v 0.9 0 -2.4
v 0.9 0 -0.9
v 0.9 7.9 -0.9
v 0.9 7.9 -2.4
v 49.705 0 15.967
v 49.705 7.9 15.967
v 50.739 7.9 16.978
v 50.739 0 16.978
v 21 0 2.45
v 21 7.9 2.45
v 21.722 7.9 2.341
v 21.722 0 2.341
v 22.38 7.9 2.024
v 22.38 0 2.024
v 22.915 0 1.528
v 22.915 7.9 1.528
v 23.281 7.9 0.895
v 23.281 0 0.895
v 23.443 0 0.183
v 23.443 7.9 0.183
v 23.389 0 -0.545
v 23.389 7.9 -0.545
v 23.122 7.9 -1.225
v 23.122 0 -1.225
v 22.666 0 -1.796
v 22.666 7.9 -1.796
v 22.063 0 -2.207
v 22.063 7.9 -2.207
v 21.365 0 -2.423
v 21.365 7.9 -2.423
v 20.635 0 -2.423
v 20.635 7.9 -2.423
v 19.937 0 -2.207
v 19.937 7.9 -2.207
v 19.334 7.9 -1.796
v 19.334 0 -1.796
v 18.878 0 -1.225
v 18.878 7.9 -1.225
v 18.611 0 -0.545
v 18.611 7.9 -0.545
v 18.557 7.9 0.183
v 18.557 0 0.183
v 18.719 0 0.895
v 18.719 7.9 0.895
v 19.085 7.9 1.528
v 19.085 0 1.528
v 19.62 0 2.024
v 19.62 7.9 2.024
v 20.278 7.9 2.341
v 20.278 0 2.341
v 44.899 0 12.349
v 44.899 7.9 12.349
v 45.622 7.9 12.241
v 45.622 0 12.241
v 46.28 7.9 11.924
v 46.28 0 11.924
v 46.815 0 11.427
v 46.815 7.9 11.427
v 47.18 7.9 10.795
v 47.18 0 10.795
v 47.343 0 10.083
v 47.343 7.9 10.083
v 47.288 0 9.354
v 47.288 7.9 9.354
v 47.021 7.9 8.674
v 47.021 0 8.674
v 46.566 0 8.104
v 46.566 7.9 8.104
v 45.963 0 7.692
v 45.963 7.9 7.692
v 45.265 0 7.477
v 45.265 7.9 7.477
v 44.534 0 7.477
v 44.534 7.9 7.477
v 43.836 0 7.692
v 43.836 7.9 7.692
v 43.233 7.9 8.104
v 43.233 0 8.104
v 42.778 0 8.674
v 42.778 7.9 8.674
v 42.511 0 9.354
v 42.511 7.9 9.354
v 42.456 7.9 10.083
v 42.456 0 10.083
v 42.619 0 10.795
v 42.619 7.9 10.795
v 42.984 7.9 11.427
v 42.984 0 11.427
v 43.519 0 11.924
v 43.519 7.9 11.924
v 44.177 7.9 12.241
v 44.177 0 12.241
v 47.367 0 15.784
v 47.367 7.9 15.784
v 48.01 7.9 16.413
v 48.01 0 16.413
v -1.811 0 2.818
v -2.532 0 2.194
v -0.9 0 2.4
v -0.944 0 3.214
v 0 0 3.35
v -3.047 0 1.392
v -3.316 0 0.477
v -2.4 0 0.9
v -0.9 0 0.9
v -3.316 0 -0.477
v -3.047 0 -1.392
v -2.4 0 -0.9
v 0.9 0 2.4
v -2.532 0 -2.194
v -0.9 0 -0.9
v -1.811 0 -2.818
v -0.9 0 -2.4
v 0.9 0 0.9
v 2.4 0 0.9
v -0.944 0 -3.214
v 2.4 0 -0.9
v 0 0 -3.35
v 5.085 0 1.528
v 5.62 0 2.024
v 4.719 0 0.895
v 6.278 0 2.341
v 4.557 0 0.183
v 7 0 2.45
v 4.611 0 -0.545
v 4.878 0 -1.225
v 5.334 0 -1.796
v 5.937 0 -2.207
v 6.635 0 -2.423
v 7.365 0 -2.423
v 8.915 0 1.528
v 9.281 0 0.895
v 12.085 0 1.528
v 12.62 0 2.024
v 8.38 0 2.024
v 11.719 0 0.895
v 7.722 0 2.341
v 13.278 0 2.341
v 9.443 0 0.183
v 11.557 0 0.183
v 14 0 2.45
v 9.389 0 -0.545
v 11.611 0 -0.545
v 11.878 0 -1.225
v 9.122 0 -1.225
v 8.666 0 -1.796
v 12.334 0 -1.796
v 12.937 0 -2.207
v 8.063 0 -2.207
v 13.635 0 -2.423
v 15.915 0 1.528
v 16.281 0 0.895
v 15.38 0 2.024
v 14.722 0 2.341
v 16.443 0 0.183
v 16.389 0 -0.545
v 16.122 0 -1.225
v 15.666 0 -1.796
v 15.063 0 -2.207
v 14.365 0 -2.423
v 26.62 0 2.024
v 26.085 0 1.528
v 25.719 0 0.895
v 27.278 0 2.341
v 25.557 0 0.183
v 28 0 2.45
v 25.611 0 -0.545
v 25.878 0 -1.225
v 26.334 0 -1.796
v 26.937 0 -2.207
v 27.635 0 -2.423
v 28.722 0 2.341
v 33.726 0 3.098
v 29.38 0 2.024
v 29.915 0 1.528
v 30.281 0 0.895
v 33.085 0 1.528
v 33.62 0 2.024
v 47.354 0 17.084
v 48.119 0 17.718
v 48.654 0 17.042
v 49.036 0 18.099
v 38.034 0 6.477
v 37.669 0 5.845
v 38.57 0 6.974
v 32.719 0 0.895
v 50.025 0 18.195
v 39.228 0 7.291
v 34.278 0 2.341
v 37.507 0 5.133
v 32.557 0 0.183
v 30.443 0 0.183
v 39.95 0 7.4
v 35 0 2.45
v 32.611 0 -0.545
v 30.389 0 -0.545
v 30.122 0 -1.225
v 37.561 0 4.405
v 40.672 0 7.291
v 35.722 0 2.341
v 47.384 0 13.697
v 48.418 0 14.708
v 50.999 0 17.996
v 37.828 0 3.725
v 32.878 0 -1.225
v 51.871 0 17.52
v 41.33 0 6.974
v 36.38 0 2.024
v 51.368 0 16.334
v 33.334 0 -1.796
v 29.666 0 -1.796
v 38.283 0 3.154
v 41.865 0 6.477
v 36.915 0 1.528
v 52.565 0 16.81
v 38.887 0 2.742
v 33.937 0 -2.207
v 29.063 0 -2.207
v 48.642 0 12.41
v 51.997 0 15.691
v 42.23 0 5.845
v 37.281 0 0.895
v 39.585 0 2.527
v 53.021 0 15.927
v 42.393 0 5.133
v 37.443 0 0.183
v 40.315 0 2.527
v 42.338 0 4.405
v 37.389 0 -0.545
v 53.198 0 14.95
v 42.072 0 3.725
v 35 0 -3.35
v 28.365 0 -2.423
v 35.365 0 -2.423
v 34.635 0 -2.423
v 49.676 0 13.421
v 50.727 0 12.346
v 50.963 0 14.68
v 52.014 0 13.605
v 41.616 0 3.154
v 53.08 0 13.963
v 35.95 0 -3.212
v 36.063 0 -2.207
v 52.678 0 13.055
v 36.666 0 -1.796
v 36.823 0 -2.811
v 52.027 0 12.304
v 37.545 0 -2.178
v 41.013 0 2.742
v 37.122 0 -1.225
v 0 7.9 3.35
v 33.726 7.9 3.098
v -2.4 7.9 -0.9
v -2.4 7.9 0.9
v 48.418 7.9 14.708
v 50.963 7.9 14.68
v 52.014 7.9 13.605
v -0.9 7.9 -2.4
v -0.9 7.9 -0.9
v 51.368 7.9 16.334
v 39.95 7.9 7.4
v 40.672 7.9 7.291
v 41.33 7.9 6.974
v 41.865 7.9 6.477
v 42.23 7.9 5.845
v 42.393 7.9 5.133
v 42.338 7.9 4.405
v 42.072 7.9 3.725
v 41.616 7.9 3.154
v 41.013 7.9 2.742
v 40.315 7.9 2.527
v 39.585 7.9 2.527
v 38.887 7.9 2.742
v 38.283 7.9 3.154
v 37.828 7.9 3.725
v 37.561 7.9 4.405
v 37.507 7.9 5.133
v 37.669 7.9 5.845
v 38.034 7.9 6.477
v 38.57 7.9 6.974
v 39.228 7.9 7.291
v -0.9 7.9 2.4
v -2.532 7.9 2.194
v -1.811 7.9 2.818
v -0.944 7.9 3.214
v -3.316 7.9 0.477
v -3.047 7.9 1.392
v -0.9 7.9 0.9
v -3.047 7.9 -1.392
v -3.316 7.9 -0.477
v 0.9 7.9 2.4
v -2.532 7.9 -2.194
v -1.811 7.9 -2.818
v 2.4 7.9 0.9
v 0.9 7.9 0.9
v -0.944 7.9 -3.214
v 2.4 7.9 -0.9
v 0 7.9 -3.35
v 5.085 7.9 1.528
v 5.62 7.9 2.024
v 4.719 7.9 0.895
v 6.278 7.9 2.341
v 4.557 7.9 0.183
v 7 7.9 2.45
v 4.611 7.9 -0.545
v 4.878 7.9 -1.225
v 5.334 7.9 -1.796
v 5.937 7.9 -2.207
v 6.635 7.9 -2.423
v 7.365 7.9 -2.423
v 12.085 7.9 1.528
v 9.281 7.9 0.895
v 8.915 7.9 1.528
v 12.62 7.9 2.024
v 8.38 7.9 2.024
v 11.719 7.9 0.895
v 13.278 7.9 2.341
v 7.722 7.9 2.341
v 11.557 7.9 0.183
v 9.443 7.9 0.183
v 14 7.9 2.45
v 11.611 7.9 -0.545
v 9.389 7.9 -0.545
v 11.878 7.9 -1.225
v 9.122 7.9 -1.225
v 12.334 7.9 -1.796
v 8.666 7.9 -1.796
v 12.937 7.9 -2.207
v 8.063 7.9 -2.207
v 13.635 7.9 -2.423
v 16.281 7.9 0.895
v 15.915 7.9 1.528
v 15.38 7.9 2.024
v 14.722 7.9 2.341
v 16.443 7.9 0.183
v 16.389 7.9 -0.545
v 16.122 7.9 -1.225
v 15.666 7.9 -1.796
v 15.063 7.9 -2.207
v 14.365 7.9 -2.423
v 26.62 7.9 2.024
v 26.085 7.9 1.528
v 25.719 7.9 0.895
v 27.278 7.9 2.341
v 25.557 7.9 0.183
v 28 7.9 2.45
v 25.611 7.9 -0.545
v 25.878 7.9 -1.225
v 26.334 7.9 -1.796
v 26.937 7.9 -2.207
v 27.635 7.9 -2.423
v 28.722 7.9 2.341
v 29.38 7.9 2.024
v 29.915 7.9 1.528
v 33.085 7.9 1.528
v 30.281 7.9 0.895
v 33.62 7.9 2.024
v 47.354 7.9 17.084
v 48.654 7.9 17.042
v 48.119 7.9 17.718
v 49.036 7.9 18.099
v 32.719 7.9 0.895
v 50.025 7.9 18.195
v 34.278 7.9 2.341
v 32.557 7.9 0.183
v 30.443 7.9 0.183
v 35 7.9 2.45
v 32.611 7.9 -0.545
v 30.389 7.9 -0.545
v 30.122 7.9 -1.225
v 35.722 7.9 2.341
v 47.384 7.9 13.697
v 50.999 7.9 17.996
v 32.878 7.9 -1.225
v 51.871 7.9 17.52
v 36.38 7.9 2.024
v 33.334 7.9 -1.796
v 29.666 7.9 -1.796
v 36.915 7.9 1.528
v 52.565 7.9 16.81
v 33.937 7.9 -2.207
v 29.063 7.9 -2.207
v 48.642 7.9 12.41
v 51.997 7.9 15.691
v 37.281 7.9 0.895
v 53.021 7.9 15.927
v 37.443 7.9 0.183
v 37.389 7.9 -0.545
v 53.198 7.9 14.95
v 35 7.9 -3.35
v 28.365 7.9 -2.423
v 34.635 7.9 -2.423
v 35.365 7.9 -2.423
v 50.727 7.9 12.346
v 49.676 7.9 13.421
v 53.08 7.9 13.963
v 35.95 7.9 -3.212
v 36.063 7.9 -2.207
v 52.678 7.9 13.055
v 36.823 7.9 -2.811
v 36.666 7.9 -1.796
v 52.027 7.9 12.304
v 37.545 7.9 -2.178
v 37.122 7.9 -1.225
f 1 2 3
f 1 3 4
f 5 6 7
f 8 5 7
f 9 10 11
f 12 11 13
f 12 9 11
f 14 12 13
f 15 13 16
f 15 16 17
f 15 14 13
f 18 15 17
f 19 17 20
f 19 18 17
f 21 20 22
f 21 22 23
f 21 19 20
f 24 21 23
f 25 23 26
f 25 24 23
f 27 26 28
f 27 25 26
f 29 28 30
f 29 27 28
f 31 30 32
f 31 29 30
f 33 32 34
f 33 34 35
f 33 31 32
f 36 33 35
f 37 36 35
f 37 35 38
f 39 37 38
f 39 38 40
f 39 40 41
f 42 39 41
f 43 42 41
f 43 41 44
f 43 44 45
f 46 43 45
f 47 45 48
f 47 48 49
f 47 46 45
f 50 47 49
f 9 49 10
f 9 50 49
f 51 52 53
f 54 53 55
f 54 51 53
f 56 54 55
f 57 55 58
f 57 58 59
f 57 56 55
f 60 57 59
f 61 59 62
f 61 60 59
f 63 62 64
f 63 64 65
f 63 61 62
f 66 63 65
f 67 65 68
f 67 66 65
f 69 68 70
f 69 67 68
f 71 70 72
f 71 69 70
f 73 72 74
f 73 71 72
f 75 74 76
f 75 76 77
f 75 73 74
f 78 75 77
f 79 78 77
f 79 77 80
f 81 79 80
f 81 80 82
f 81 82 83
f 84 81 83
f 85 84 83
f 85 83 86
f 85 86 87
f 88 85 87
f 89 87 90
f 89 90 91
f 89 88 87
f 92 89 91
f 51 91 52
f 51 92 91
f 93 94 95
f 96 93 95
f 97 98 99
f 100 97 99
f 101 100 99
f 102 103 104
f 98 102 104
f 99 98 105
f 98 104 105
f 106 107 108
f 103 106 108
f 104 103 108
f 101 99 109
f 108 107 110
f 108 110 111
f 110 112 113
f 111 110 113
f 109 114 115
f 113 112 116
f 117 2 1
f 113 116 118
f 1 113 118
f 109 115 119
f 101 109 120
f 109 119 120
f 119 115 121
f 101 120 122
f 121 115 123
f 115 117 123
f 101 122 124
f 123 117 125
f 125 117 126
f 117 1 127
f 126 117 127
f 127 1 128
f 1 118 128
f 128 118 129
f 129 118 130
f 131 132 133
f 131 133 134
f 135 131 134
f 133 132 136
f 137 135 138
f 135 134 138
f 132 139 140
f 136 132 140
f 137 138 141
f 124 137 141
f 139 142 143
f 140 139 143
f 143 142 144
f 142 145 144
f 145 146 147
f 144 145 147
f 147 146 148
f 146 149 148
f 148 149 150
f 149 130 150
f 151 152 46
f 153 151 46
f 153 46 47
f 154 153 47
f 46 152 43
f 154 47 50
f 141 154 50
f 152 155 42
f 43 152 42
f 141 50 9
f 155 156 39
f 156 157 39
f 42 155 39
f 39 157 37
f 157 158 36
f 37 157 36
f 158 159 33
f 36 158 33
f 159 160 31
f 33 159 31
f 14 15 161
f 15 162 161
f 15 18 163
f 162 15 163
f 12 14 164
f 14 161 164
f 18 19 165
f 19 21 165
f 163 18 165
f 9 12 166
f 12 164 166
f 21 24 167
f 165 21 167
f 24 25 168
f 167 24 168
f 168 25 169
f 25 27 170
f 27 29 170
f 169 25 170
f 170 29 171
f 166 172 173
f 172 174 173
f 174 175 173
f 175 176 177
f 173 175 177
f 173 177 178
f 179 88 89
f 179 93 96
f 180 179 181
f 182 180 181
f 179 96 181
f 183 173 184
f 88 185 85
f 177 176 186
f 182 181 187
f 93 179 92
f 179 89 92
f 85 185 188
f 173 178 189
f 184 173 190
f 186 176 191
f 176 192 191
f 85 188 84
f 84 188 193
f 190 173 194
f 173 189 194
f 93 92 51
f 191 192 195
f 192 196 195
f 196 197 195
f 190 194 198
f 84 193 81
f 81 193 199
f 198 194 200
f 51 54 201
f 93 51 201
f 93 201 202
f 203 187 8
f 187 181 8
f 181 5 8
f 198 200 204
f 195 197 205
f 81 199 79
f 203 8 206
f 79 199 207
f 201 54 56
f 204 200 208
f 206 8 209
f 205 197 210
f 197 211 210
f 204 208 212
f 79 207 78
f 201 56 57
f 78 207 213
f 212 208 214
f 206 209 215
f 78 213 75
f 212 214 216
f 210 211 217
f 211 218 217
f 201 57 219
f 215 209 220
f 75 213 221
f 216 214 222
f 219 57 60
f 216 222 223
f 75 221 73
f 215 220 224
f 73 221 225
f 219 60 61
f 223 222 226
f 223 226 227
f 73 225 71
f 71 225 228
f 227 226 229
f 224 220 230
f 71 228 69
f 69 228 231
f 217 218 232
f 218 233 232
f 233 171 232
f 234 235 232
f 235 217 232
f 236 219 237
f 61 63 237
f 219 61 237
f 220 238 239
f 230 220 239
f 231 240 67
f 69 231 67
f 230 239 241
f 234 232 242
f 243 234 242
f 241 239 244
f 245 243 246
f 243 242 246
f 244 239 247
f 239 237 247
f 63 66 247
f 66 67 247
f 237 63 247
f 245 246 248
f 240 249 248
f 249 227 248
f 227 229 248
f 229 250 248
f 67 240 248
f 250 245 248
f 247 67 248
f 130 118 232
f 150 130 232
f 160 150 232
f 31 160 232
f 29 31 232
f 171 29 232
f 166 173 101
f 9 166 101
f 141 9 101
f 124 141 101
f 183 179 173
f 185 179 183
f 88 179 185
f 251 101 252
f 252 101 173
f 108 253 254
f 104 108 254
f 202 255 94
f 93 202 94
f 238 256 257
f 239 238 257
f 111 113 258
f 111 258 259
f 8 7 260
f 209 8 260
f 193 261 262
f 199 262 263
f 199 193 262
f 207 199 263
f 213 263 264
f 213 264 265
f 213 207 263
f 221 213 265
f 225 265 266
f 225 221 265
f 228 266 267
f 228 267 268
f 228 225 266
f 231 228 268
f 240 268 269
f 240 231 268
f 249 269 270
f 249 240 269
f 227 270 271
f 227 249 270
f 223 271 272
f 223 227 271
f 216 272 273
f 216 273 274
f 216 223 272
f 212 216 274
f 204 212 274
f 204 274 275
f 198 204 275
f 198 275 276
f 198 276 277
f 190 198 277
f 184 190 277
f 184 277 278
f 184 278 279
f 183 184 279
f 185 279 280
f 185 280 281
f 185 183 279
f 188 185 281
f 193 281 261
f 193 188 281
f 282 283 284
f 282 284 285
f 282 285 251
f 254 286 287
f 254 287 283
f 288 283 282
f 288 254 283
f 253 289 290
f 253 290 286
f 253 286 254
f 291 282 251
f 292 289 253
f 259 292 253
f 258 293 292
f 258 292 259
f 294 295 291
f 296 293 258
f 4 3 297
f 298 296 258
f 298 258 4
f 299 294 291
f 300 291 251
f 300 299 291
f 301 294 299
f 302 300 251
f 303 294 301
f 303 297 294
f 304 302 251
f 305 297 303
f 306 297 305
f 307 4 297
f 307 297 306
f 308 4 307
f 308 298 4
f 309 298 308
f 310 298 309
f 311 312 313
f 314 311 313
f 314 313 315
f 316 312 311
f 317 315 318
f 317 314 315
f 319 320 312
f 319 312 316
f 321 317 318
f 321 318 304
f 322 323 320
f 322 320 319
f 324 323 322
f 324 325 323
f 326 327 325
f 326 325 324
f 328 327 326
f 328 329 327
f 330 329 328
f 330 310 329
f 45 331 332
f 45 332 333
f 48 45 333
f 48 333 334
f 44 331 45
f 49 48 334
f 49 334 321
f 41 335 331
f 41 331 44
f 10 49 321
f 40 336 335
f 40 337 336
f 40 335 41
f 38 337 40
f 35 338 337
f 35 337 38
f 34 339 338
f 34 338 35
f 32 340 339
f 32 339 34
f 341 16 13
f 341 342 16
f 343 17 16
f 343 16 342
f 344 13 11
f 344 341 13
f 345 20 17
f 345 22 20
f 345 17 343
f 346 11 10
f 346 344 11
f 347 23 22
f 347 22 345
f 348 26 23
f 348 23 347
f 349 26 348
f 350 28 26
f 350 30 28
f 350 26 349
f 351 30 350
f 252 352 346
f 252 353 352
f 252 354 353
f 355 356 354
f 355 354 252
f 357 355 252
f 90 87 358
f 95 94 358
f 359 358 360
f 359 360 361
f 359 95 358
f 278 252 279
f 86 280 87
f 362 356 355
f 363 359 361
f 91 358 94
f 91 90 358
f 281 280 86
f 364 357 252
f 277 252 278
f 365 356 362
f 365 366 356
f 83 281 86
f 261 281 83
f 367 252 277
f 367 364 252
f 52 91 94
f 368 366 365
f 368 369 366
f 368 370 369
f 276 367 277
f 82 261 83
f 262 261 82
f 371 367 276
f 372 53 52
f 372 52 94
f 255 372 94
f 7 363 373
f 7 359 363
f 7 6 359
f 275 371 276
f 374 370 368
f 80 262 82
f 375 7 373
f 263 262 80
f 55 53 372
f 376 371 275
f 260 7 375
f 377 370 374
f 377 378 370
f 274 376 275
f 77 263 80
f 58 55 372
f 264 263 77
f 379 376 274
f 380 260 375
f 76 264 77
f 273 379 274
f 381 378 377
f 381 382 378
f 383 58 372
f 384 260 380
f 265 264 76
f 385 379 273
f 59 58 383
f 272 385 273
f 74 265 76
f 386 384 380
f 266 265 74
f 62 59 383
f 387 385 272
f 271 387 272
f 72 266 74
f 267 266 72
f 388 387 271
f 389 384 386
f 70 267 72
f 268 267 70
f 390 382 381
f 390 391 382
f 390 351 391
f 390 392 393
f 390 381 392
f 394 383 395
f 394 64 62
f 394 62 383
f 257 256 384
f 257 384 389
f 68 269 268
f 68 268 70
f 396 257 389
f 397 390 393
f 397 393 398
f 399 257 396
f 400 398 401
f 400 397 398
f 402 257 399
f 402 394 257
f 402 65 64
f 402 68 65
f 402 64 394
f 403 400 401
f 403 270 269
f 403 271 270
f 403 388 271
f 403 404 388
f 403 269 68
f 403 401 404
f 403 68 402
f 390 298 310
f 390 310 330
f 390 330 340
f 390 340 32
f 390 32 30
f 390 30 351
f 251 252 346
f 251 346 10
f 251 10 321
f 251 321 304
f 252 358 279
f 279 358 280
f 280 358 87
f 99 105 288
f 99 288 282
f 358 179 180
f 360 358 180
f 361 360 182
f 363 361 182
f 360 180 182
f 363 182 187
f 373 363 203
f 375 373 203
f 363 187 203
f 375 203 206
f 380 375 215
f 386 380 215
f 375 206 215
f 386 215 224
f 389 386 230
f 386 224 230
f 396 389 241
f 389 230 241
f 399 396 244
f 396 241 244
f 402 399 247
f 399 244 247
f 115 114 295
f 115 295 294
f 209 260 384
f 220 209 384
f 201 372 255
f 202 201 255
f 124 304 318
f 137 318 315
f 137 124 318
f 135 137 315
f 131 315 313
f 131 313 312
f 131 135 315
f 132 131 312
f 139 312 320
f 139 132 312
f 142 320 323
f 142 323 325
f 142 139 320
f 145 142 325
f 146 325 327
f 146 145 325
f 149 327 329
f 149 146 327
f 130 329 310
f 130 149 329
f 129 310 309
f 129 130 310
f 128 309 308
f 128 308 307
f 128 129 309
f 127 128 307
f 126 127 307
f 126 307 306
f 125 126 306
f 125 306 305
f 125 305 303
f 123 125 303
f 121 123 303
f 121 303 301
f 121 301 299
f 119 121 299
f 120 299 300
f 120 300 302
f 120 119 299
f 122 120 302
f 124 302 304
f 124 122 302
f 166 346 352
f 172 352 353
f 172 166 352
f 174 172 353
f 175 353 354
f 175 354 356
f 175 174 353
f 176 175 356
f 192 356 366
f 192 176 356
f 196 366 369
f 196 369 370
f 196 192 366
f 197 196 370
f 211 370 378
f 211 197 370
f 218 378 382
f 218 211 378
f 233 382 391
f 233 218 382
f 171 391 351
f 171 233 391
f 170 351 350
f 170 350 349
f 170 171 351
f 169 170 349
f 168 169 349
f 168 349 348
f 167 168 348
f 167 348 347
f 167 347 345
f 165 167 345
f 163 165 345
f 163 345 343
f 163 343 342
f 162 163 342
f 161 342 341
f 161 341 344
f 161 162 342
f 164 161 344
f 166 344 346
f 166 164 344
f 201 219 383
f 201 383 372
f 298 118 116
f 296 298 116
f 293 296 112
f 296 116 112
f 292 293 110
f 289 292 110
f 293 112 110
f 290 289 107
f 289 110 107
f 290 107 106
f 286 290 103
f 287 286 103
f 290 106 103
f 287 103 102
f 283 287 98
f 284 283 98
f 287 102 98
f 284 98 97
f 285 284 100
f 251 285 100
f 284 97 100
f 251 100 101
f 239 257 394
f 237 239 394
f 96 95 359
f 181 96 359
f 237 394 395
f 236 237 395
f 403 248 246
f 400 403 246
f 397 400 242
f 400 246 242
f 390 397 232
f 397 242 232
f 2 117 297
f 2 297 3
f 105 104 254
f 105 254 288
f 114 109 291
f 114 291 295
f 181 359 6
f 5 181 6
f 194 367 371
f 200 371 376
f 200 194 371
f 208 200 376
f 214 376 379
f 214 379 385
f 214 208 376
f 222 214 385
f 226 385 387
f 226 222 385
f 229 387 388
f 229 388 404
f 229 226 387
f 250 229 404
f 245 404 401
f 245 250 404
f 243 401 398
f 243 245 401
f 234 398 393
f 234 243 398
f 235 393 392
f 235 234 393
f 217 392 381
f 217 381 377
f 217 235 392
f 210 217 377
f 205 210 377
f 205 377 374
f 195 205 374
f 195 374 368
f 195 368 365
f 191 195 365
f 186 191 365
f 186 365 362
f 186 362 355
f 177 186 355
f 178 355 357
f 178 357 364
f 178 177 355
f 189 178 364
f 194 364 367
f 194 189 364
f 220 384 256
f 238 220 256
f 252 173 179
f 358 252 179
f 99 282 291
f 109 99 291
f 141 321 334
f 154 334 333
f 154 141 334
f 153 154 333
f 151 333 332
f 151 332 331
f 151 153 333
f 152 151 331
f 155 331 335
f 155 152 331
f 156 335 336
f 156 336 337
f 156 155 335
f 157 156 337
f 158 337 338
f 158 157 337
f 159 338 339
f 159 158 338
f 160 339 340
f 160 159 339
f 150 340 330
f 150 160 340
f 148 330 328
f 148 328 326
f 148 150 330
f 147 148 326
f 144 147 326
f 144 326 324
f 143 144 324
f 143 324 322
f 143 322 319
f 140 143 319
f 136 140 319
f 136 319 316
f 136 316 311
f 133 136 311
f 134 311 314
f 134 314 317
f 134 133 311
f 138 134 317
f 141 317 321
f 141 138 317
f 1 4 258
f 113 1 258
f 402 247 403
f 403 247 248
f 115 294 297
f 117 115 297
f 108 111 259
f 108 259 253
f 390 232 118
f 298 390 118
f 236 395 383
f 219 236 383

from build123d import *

# Parameters (mm, degrees)
SKETCH1_R           = 2.45
BOSS_EXTRUDE2_DEPTH = 7.9
CUT_EXTRUDE1_DEPTH  = 7.9
CUT_EXTRUDE2_DEPTH  = 7.9


with BuildPart() as part:
    # Sketch1 → Boss-Extrude2 (new body)
    with BuildSketch(Plane(origin=(0, 0, 0), x_dir=(1, 0, 0), z_dir=(0, 1, 0))):
        with BuildLine():
            Line((52.027202313, -12.303856257), (37.545386148, 2.177959908))
            ThreePointArc((37.545386148, 2.177959908), (36.40113067, 3.042915189), (35, 3.35))
            Line((35, 3.35), (0, 3.35))
            ThreePointArc((0, 3.35), (-3.35, 0), (0, -3.35))
            Line((0, -3.35), (33.72619107, -3.098372284))
            Line((33.72619107, -3.098372284), (47.353836826, -17.084292963))
            ThreePointArc((47.353836826, -17.084292963), (52.244724969, -17.191071452), (52.027202313, -12.303856257))
        make_face()
        with Locations(Location((44.899494937, -9.899494937, 0), (0, 0, 270))):
            Circle(SKETCH1_R, mode=Mode.SUBTRACT)
        with Locations(Location((39.949747468, -4.949747468, 0), (0, 0, 270))):
            Circle(SKETCH1_R, mode=Mode.SUBTRACT)
        with Locations(Location((7, 0, 0), (0, 0, 270))):
            Circle(SKETCH1_R, mode=Mode.SUBTRACT)
        with Locations(Location((14, 0, 0), (0, 0, 270))):
            Circle(SKETCH1_R, mode=Mode.SUBTRACT)
        with Locations(Location((21, 0, 0), (0, 0, 270))):
            Circle(SKETCH1_R, mode=Mode.SUBTRACT)
        with Locations(Location((35, 0, 0), (0, 0, 270))):
            Circle(SKETCH1_R, mode=Mode.SUBTRACT)
        with Locations(Location((28, 0, 0), (0, 0, 270))):
            Circle(SKETCH1_R, mode=Mode.SUBTRACT)
    extrude(amount=BOSS_EXTRUDE2_DEPTH)

    # Sketch2 → Cut-Extrude1 (cut)
    with BuildSketch(Plane(origin=(0, 7.9, 0), x_dir=(1, 0, 0), z_dir=(0, 1, 0))):
        Polygon((0, 2.4), (0, 0), (0, -2.4), (0.9, -2.4), (0.9, -0.9), (2.4, -0.9), (2.4, 0.9), (0.9, 0.9), (0.9, 2.4), align=None)
        Polygon((-2.4, 0), (0, 0), (0, 2.4), (-0.9, 2.4), (-0.9, 0.9), (-2.4, 0.9), align=None)
        Polygon((0, -2.4), (0, 0), (-2.4, 0), (-2.4, -0.9), (-0.9, -0.9), (-0.9, -2.4), align=None)
    extrude(amount=-CUT_EXTRUDE1_DEPTH, mode=Mode.SUBTRACT)

    # Sketch3 → Cut-Extrude2 (cut)
    with BuildSketch(Plane(origin=(0, 7.9, 0), x_dir=(1, 0, 0), z_dir=(0, 1, 0))):
        Polygon((49.704933947, -15.966785192), (49.061371467, -15.33763709), (48.010311985, -16.412777338), (48.653874465, -17.041925441), align=None)
        Polygon((48.010311985, -16.412777338), (49.061371467, -15.33763709), (48.417808987, -14.708488988), (47.366749505, -15.783629236), align=None)
        Polygon((49.061371467, -15.33763709), (49.690519569, -14.69407461), (49.04695709, -14.064926508), (48.417808987, -14.708488988), align=None)
        Polygon((50.334082049, -15.323222713), (49.690519569, -14.69407461), (49.061371467, -15.33763709), (49.704933947, -15.966785192), align=None)
        Polygon((51.368247842, -16.334225476), (50.334082049, -15.323222713), (49.704933947, -15.966785192), (50.73909974, -16.977787956), align=None)
        Polygon((51.997395944, -15.690662997), (50.963230152, -14.679660233), (50.334082049, -15.323222713), (51.368247842, -16.334225476), align=None)
        Polygon((50.963230152, -14.679660233), (50.319667672, -14.05051213), (49.690519569, -14.69407461), (50.334082049, -15.323222713), align=None)
        Polygon((52.014289634, -13.604519984), (51.370727154, -12.975371882), (50.319667672, -14.05051213), (50.963230152, -14.679660233), align=None)
        Polygon((50.319667672, -14.05051213), (51.370727154, -12.975371882), (50.727164674, -12.34622378), (49.676105192, -13.421364028), align=None)
        Polygon((49.690519569, -14.69407461), (50.319667672, -14.05051213), (49.676105192, -13.421364028), (49.04695709, -14.064926508), align=None)
        Polygon((49.04695709, -14.064926508), (49.676105192, -13.421364028), (48.641939399, -12.410361264), (48.012791297, -13.053923744), align=None)
        Polygon((48.417808987, -14.708488988), (49.04695709, -14.064926508), (48.012791297, -13.053923744), (47.383643195, -13.697486224), align=None)
    extrude(amount=-CUT_EXTRUDE2_DEPTH, mode=Mode.SUBTRACT)


solid = part.part
